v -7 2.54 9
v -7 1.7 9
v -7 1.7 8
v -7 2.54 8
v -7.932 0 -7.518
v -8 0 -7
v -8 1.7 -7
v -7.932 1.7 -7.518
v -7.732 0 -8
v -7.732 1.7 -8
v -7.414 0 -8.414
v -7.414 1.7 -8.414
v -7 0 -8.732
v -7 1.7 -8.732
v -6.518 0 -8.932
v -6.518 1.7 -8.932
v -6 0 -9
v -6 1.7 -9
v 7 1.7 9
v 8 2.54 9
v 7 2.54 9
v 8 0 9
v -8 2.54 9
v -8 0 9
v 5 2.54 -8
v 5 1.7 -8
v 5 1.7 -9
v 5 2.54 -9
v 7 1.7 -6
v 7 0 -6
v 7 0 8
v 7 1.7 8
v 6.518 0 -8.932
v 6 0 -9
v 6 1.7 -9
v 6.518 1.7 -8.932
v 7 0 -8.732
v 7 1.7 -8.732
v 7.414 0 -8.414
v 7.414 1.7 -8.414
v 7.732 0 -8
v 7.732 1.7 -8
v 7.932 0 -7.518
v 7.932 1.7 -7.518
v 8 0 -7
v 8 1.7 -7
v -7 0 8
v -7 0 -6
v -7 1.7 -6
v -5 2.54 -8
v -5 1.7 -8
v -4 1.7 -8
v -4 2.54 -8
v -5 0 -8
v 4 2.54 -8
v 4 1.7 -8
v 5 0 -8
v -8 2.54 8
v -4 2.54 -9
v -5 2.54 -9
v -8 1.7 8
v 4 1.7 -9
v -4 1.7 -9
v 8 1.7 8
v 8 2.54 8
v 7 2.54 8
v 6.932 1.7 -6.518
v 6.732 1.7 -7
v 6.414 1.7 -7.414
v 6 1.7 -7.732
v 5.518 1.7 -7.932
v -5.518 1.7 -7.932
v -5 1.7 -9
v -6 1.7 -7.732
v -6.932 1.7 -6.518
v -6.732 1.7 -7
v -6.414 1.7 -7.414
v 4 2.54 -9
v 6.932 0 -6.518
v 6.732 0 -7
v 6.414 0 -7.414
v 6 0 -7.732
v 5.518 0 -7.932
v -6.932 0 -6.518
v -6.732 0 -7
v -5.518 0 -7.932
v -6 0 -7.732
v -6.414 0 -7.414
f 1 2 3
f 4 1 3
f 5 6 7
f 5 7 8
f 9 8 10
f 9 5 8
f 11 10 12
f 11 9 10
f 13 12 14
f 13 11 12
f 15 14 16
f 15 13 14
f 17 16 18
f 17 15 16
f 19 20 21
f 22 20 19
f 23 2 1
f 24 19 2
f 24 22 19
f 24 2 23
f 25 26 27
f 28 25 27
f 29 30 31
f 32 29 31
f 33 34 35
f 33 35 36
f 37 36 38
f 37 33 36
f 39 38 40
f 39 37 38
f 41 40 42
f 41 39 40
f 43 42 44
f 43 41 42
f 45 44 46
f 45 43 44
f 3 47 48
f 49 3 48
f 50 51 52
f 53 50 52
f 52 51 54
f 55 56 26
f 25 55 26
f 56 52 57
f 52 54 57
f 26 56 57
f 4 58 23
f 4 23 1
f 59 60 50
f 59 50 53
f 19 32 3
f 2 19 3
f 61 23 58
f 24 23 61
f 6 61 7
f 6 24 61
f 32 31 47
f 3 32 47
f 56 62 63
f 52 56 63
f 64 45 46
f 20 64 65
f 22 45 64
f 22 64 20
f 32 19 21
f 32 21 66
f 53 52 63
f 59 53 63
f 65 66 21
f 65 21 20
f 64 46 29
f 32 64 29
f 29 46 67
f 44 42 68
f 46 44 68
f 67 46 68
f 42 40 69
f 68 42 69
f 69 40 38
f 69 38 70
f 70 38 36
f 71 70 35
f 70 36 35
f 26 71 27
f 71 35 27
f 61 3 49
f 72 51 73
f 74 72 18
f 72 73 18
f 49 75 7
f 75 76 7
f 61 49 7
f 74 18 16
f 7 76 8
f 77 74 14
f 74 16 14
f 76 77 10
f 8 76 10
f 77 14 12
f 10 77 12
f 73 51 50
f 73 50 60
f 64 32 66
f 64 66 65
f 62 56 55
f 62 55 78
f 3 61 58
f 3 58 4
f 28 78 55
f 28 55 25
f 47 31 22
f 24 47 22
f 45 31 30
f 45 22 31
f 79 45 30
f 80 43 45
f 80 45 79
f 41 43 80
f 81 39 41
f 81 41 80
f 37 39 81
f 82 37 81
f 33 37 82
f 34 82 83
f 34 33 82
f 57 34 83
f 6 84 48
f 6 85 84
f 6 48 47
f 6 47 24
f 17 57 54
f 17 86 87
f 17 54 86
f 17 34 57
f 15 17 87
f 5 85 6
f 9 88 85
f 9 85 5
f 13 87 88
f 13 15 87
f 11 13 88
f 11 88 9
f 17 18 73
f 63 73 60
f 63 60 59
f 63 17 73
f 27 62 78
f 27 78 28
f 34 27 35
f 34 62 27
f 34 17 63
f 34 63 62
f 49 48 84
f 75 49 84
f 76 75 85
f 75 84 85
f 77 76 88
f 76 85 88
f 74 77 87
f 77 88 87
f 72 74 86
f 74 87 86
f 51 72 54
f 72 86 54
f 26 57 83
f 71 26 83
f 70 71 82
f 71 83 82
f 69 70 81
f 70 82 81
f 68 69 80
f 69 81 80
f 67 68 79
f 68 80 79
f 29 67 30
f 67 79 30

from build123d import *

# Parameters (mm, degrees)
BOSS_EXTRUDE1_DEPTH = 1.7
BOSS_EXTRUDE3_DEPTH = 1.7
CUT_EXTRUDE1_DEPTH  = 1.7
SKETCH5_W           = 1
SKETCH5_H           = 1
BOSS_EXTRUDE4_DEPTH = 0.84


with BuildPart() as part:
    # Sketch1 → Boss-Extrude1 (new body)
    with BuildSketch(Plane(origin=(0, 0, 0), x_dir=(1, 0, 0), z_dir=(0, 1, 0))):
        with BuildLine():
            Line((-5, 8), (5, 8))
            ThreePointArc((5, 8), (6.414213562, 7.414213562), (7, 6))
            Line((7, 6), (7, -8))
            Line((7, -8), (-7, -8))
            Line((-7, -8), (-7, 6))
            ThreePointArc((-7, 6), (-6.414213562, 7.414213562), (-5, 8))
        make_face()
    extrude(amount=BOSS_EXTRUDE1_DEPTH)

    # Sketch3 → Boss-Extrude3 (add)
    with BuildSketch(Plane(origin=(0, 0, 0), x_dir=(1, 0, 0), z_dir=(0, 1, 0))):
        with BuildLine():
            Line((-6, 9), (6, 9))
            ThreePointArc((6, 9), (7.414213562, 8.414213562), (8, 7))
            Line((8, 7), (8, -9))
            Line((8, -9), (-8, -9))
            Line((-8, -9), (-8, 7))
            ThreePointArc((-8, 7), (-7.414213562, 8.414213562), (-6, 9))
        make_face()
    extrude(amount=BOSS_EXTRUDE3_DEPTH)

    # Sketch1<2> → Cut-Extrude1 (cut)
    with BuildSketch(Plane(origin=(0, 0, 0), x_dir=(1, 0, 0), z_dir=(0, 1, 0))):
        with BuildLine():
            Line((-5, 8), (5, 8))
            ThreePointArc((5, 8), (6.414213562, 7.414213562), (7, 6))
            Line((7, 6), (7, -8))
            Line((7, -8), (-7, -8))
            Line((-7, -8), (-7, 6))
            ThreePointArc((-7, 6), (-6.414213562, 7.414213562), (-5, 8))
        make_face()
    extrude(amount=CUT_EXTRUDE1_DEPTH, mode=Mode.SUBTRACT)

    # Sketch5 → Boss-Extrude4 (add)
    with BuildSketch(Plane(origin=(0, 1.7, 0), x_dir=(1, 0, 0), z_dir=(0, 1, 0))):
        with Locations((-4.5, 8.5)):
            Rectangle(SKETCH5_W, SKETCH5_H)
        with Locations((-7.5, -8.5)):
            Rectangle(SKETCH5_W, SKETCH5_H)
        with Locations((7.5, -8.5)):
            Rectangle(SKETCH5_W, SKETCH5_H)
        with Locations((4.5, 8.5)):
            Rectangle(SKETCH5_W, SKETCH5_H)
    extrude(amount=BOSS_EXTRUDE4_DEPTH)


solid = part.part
